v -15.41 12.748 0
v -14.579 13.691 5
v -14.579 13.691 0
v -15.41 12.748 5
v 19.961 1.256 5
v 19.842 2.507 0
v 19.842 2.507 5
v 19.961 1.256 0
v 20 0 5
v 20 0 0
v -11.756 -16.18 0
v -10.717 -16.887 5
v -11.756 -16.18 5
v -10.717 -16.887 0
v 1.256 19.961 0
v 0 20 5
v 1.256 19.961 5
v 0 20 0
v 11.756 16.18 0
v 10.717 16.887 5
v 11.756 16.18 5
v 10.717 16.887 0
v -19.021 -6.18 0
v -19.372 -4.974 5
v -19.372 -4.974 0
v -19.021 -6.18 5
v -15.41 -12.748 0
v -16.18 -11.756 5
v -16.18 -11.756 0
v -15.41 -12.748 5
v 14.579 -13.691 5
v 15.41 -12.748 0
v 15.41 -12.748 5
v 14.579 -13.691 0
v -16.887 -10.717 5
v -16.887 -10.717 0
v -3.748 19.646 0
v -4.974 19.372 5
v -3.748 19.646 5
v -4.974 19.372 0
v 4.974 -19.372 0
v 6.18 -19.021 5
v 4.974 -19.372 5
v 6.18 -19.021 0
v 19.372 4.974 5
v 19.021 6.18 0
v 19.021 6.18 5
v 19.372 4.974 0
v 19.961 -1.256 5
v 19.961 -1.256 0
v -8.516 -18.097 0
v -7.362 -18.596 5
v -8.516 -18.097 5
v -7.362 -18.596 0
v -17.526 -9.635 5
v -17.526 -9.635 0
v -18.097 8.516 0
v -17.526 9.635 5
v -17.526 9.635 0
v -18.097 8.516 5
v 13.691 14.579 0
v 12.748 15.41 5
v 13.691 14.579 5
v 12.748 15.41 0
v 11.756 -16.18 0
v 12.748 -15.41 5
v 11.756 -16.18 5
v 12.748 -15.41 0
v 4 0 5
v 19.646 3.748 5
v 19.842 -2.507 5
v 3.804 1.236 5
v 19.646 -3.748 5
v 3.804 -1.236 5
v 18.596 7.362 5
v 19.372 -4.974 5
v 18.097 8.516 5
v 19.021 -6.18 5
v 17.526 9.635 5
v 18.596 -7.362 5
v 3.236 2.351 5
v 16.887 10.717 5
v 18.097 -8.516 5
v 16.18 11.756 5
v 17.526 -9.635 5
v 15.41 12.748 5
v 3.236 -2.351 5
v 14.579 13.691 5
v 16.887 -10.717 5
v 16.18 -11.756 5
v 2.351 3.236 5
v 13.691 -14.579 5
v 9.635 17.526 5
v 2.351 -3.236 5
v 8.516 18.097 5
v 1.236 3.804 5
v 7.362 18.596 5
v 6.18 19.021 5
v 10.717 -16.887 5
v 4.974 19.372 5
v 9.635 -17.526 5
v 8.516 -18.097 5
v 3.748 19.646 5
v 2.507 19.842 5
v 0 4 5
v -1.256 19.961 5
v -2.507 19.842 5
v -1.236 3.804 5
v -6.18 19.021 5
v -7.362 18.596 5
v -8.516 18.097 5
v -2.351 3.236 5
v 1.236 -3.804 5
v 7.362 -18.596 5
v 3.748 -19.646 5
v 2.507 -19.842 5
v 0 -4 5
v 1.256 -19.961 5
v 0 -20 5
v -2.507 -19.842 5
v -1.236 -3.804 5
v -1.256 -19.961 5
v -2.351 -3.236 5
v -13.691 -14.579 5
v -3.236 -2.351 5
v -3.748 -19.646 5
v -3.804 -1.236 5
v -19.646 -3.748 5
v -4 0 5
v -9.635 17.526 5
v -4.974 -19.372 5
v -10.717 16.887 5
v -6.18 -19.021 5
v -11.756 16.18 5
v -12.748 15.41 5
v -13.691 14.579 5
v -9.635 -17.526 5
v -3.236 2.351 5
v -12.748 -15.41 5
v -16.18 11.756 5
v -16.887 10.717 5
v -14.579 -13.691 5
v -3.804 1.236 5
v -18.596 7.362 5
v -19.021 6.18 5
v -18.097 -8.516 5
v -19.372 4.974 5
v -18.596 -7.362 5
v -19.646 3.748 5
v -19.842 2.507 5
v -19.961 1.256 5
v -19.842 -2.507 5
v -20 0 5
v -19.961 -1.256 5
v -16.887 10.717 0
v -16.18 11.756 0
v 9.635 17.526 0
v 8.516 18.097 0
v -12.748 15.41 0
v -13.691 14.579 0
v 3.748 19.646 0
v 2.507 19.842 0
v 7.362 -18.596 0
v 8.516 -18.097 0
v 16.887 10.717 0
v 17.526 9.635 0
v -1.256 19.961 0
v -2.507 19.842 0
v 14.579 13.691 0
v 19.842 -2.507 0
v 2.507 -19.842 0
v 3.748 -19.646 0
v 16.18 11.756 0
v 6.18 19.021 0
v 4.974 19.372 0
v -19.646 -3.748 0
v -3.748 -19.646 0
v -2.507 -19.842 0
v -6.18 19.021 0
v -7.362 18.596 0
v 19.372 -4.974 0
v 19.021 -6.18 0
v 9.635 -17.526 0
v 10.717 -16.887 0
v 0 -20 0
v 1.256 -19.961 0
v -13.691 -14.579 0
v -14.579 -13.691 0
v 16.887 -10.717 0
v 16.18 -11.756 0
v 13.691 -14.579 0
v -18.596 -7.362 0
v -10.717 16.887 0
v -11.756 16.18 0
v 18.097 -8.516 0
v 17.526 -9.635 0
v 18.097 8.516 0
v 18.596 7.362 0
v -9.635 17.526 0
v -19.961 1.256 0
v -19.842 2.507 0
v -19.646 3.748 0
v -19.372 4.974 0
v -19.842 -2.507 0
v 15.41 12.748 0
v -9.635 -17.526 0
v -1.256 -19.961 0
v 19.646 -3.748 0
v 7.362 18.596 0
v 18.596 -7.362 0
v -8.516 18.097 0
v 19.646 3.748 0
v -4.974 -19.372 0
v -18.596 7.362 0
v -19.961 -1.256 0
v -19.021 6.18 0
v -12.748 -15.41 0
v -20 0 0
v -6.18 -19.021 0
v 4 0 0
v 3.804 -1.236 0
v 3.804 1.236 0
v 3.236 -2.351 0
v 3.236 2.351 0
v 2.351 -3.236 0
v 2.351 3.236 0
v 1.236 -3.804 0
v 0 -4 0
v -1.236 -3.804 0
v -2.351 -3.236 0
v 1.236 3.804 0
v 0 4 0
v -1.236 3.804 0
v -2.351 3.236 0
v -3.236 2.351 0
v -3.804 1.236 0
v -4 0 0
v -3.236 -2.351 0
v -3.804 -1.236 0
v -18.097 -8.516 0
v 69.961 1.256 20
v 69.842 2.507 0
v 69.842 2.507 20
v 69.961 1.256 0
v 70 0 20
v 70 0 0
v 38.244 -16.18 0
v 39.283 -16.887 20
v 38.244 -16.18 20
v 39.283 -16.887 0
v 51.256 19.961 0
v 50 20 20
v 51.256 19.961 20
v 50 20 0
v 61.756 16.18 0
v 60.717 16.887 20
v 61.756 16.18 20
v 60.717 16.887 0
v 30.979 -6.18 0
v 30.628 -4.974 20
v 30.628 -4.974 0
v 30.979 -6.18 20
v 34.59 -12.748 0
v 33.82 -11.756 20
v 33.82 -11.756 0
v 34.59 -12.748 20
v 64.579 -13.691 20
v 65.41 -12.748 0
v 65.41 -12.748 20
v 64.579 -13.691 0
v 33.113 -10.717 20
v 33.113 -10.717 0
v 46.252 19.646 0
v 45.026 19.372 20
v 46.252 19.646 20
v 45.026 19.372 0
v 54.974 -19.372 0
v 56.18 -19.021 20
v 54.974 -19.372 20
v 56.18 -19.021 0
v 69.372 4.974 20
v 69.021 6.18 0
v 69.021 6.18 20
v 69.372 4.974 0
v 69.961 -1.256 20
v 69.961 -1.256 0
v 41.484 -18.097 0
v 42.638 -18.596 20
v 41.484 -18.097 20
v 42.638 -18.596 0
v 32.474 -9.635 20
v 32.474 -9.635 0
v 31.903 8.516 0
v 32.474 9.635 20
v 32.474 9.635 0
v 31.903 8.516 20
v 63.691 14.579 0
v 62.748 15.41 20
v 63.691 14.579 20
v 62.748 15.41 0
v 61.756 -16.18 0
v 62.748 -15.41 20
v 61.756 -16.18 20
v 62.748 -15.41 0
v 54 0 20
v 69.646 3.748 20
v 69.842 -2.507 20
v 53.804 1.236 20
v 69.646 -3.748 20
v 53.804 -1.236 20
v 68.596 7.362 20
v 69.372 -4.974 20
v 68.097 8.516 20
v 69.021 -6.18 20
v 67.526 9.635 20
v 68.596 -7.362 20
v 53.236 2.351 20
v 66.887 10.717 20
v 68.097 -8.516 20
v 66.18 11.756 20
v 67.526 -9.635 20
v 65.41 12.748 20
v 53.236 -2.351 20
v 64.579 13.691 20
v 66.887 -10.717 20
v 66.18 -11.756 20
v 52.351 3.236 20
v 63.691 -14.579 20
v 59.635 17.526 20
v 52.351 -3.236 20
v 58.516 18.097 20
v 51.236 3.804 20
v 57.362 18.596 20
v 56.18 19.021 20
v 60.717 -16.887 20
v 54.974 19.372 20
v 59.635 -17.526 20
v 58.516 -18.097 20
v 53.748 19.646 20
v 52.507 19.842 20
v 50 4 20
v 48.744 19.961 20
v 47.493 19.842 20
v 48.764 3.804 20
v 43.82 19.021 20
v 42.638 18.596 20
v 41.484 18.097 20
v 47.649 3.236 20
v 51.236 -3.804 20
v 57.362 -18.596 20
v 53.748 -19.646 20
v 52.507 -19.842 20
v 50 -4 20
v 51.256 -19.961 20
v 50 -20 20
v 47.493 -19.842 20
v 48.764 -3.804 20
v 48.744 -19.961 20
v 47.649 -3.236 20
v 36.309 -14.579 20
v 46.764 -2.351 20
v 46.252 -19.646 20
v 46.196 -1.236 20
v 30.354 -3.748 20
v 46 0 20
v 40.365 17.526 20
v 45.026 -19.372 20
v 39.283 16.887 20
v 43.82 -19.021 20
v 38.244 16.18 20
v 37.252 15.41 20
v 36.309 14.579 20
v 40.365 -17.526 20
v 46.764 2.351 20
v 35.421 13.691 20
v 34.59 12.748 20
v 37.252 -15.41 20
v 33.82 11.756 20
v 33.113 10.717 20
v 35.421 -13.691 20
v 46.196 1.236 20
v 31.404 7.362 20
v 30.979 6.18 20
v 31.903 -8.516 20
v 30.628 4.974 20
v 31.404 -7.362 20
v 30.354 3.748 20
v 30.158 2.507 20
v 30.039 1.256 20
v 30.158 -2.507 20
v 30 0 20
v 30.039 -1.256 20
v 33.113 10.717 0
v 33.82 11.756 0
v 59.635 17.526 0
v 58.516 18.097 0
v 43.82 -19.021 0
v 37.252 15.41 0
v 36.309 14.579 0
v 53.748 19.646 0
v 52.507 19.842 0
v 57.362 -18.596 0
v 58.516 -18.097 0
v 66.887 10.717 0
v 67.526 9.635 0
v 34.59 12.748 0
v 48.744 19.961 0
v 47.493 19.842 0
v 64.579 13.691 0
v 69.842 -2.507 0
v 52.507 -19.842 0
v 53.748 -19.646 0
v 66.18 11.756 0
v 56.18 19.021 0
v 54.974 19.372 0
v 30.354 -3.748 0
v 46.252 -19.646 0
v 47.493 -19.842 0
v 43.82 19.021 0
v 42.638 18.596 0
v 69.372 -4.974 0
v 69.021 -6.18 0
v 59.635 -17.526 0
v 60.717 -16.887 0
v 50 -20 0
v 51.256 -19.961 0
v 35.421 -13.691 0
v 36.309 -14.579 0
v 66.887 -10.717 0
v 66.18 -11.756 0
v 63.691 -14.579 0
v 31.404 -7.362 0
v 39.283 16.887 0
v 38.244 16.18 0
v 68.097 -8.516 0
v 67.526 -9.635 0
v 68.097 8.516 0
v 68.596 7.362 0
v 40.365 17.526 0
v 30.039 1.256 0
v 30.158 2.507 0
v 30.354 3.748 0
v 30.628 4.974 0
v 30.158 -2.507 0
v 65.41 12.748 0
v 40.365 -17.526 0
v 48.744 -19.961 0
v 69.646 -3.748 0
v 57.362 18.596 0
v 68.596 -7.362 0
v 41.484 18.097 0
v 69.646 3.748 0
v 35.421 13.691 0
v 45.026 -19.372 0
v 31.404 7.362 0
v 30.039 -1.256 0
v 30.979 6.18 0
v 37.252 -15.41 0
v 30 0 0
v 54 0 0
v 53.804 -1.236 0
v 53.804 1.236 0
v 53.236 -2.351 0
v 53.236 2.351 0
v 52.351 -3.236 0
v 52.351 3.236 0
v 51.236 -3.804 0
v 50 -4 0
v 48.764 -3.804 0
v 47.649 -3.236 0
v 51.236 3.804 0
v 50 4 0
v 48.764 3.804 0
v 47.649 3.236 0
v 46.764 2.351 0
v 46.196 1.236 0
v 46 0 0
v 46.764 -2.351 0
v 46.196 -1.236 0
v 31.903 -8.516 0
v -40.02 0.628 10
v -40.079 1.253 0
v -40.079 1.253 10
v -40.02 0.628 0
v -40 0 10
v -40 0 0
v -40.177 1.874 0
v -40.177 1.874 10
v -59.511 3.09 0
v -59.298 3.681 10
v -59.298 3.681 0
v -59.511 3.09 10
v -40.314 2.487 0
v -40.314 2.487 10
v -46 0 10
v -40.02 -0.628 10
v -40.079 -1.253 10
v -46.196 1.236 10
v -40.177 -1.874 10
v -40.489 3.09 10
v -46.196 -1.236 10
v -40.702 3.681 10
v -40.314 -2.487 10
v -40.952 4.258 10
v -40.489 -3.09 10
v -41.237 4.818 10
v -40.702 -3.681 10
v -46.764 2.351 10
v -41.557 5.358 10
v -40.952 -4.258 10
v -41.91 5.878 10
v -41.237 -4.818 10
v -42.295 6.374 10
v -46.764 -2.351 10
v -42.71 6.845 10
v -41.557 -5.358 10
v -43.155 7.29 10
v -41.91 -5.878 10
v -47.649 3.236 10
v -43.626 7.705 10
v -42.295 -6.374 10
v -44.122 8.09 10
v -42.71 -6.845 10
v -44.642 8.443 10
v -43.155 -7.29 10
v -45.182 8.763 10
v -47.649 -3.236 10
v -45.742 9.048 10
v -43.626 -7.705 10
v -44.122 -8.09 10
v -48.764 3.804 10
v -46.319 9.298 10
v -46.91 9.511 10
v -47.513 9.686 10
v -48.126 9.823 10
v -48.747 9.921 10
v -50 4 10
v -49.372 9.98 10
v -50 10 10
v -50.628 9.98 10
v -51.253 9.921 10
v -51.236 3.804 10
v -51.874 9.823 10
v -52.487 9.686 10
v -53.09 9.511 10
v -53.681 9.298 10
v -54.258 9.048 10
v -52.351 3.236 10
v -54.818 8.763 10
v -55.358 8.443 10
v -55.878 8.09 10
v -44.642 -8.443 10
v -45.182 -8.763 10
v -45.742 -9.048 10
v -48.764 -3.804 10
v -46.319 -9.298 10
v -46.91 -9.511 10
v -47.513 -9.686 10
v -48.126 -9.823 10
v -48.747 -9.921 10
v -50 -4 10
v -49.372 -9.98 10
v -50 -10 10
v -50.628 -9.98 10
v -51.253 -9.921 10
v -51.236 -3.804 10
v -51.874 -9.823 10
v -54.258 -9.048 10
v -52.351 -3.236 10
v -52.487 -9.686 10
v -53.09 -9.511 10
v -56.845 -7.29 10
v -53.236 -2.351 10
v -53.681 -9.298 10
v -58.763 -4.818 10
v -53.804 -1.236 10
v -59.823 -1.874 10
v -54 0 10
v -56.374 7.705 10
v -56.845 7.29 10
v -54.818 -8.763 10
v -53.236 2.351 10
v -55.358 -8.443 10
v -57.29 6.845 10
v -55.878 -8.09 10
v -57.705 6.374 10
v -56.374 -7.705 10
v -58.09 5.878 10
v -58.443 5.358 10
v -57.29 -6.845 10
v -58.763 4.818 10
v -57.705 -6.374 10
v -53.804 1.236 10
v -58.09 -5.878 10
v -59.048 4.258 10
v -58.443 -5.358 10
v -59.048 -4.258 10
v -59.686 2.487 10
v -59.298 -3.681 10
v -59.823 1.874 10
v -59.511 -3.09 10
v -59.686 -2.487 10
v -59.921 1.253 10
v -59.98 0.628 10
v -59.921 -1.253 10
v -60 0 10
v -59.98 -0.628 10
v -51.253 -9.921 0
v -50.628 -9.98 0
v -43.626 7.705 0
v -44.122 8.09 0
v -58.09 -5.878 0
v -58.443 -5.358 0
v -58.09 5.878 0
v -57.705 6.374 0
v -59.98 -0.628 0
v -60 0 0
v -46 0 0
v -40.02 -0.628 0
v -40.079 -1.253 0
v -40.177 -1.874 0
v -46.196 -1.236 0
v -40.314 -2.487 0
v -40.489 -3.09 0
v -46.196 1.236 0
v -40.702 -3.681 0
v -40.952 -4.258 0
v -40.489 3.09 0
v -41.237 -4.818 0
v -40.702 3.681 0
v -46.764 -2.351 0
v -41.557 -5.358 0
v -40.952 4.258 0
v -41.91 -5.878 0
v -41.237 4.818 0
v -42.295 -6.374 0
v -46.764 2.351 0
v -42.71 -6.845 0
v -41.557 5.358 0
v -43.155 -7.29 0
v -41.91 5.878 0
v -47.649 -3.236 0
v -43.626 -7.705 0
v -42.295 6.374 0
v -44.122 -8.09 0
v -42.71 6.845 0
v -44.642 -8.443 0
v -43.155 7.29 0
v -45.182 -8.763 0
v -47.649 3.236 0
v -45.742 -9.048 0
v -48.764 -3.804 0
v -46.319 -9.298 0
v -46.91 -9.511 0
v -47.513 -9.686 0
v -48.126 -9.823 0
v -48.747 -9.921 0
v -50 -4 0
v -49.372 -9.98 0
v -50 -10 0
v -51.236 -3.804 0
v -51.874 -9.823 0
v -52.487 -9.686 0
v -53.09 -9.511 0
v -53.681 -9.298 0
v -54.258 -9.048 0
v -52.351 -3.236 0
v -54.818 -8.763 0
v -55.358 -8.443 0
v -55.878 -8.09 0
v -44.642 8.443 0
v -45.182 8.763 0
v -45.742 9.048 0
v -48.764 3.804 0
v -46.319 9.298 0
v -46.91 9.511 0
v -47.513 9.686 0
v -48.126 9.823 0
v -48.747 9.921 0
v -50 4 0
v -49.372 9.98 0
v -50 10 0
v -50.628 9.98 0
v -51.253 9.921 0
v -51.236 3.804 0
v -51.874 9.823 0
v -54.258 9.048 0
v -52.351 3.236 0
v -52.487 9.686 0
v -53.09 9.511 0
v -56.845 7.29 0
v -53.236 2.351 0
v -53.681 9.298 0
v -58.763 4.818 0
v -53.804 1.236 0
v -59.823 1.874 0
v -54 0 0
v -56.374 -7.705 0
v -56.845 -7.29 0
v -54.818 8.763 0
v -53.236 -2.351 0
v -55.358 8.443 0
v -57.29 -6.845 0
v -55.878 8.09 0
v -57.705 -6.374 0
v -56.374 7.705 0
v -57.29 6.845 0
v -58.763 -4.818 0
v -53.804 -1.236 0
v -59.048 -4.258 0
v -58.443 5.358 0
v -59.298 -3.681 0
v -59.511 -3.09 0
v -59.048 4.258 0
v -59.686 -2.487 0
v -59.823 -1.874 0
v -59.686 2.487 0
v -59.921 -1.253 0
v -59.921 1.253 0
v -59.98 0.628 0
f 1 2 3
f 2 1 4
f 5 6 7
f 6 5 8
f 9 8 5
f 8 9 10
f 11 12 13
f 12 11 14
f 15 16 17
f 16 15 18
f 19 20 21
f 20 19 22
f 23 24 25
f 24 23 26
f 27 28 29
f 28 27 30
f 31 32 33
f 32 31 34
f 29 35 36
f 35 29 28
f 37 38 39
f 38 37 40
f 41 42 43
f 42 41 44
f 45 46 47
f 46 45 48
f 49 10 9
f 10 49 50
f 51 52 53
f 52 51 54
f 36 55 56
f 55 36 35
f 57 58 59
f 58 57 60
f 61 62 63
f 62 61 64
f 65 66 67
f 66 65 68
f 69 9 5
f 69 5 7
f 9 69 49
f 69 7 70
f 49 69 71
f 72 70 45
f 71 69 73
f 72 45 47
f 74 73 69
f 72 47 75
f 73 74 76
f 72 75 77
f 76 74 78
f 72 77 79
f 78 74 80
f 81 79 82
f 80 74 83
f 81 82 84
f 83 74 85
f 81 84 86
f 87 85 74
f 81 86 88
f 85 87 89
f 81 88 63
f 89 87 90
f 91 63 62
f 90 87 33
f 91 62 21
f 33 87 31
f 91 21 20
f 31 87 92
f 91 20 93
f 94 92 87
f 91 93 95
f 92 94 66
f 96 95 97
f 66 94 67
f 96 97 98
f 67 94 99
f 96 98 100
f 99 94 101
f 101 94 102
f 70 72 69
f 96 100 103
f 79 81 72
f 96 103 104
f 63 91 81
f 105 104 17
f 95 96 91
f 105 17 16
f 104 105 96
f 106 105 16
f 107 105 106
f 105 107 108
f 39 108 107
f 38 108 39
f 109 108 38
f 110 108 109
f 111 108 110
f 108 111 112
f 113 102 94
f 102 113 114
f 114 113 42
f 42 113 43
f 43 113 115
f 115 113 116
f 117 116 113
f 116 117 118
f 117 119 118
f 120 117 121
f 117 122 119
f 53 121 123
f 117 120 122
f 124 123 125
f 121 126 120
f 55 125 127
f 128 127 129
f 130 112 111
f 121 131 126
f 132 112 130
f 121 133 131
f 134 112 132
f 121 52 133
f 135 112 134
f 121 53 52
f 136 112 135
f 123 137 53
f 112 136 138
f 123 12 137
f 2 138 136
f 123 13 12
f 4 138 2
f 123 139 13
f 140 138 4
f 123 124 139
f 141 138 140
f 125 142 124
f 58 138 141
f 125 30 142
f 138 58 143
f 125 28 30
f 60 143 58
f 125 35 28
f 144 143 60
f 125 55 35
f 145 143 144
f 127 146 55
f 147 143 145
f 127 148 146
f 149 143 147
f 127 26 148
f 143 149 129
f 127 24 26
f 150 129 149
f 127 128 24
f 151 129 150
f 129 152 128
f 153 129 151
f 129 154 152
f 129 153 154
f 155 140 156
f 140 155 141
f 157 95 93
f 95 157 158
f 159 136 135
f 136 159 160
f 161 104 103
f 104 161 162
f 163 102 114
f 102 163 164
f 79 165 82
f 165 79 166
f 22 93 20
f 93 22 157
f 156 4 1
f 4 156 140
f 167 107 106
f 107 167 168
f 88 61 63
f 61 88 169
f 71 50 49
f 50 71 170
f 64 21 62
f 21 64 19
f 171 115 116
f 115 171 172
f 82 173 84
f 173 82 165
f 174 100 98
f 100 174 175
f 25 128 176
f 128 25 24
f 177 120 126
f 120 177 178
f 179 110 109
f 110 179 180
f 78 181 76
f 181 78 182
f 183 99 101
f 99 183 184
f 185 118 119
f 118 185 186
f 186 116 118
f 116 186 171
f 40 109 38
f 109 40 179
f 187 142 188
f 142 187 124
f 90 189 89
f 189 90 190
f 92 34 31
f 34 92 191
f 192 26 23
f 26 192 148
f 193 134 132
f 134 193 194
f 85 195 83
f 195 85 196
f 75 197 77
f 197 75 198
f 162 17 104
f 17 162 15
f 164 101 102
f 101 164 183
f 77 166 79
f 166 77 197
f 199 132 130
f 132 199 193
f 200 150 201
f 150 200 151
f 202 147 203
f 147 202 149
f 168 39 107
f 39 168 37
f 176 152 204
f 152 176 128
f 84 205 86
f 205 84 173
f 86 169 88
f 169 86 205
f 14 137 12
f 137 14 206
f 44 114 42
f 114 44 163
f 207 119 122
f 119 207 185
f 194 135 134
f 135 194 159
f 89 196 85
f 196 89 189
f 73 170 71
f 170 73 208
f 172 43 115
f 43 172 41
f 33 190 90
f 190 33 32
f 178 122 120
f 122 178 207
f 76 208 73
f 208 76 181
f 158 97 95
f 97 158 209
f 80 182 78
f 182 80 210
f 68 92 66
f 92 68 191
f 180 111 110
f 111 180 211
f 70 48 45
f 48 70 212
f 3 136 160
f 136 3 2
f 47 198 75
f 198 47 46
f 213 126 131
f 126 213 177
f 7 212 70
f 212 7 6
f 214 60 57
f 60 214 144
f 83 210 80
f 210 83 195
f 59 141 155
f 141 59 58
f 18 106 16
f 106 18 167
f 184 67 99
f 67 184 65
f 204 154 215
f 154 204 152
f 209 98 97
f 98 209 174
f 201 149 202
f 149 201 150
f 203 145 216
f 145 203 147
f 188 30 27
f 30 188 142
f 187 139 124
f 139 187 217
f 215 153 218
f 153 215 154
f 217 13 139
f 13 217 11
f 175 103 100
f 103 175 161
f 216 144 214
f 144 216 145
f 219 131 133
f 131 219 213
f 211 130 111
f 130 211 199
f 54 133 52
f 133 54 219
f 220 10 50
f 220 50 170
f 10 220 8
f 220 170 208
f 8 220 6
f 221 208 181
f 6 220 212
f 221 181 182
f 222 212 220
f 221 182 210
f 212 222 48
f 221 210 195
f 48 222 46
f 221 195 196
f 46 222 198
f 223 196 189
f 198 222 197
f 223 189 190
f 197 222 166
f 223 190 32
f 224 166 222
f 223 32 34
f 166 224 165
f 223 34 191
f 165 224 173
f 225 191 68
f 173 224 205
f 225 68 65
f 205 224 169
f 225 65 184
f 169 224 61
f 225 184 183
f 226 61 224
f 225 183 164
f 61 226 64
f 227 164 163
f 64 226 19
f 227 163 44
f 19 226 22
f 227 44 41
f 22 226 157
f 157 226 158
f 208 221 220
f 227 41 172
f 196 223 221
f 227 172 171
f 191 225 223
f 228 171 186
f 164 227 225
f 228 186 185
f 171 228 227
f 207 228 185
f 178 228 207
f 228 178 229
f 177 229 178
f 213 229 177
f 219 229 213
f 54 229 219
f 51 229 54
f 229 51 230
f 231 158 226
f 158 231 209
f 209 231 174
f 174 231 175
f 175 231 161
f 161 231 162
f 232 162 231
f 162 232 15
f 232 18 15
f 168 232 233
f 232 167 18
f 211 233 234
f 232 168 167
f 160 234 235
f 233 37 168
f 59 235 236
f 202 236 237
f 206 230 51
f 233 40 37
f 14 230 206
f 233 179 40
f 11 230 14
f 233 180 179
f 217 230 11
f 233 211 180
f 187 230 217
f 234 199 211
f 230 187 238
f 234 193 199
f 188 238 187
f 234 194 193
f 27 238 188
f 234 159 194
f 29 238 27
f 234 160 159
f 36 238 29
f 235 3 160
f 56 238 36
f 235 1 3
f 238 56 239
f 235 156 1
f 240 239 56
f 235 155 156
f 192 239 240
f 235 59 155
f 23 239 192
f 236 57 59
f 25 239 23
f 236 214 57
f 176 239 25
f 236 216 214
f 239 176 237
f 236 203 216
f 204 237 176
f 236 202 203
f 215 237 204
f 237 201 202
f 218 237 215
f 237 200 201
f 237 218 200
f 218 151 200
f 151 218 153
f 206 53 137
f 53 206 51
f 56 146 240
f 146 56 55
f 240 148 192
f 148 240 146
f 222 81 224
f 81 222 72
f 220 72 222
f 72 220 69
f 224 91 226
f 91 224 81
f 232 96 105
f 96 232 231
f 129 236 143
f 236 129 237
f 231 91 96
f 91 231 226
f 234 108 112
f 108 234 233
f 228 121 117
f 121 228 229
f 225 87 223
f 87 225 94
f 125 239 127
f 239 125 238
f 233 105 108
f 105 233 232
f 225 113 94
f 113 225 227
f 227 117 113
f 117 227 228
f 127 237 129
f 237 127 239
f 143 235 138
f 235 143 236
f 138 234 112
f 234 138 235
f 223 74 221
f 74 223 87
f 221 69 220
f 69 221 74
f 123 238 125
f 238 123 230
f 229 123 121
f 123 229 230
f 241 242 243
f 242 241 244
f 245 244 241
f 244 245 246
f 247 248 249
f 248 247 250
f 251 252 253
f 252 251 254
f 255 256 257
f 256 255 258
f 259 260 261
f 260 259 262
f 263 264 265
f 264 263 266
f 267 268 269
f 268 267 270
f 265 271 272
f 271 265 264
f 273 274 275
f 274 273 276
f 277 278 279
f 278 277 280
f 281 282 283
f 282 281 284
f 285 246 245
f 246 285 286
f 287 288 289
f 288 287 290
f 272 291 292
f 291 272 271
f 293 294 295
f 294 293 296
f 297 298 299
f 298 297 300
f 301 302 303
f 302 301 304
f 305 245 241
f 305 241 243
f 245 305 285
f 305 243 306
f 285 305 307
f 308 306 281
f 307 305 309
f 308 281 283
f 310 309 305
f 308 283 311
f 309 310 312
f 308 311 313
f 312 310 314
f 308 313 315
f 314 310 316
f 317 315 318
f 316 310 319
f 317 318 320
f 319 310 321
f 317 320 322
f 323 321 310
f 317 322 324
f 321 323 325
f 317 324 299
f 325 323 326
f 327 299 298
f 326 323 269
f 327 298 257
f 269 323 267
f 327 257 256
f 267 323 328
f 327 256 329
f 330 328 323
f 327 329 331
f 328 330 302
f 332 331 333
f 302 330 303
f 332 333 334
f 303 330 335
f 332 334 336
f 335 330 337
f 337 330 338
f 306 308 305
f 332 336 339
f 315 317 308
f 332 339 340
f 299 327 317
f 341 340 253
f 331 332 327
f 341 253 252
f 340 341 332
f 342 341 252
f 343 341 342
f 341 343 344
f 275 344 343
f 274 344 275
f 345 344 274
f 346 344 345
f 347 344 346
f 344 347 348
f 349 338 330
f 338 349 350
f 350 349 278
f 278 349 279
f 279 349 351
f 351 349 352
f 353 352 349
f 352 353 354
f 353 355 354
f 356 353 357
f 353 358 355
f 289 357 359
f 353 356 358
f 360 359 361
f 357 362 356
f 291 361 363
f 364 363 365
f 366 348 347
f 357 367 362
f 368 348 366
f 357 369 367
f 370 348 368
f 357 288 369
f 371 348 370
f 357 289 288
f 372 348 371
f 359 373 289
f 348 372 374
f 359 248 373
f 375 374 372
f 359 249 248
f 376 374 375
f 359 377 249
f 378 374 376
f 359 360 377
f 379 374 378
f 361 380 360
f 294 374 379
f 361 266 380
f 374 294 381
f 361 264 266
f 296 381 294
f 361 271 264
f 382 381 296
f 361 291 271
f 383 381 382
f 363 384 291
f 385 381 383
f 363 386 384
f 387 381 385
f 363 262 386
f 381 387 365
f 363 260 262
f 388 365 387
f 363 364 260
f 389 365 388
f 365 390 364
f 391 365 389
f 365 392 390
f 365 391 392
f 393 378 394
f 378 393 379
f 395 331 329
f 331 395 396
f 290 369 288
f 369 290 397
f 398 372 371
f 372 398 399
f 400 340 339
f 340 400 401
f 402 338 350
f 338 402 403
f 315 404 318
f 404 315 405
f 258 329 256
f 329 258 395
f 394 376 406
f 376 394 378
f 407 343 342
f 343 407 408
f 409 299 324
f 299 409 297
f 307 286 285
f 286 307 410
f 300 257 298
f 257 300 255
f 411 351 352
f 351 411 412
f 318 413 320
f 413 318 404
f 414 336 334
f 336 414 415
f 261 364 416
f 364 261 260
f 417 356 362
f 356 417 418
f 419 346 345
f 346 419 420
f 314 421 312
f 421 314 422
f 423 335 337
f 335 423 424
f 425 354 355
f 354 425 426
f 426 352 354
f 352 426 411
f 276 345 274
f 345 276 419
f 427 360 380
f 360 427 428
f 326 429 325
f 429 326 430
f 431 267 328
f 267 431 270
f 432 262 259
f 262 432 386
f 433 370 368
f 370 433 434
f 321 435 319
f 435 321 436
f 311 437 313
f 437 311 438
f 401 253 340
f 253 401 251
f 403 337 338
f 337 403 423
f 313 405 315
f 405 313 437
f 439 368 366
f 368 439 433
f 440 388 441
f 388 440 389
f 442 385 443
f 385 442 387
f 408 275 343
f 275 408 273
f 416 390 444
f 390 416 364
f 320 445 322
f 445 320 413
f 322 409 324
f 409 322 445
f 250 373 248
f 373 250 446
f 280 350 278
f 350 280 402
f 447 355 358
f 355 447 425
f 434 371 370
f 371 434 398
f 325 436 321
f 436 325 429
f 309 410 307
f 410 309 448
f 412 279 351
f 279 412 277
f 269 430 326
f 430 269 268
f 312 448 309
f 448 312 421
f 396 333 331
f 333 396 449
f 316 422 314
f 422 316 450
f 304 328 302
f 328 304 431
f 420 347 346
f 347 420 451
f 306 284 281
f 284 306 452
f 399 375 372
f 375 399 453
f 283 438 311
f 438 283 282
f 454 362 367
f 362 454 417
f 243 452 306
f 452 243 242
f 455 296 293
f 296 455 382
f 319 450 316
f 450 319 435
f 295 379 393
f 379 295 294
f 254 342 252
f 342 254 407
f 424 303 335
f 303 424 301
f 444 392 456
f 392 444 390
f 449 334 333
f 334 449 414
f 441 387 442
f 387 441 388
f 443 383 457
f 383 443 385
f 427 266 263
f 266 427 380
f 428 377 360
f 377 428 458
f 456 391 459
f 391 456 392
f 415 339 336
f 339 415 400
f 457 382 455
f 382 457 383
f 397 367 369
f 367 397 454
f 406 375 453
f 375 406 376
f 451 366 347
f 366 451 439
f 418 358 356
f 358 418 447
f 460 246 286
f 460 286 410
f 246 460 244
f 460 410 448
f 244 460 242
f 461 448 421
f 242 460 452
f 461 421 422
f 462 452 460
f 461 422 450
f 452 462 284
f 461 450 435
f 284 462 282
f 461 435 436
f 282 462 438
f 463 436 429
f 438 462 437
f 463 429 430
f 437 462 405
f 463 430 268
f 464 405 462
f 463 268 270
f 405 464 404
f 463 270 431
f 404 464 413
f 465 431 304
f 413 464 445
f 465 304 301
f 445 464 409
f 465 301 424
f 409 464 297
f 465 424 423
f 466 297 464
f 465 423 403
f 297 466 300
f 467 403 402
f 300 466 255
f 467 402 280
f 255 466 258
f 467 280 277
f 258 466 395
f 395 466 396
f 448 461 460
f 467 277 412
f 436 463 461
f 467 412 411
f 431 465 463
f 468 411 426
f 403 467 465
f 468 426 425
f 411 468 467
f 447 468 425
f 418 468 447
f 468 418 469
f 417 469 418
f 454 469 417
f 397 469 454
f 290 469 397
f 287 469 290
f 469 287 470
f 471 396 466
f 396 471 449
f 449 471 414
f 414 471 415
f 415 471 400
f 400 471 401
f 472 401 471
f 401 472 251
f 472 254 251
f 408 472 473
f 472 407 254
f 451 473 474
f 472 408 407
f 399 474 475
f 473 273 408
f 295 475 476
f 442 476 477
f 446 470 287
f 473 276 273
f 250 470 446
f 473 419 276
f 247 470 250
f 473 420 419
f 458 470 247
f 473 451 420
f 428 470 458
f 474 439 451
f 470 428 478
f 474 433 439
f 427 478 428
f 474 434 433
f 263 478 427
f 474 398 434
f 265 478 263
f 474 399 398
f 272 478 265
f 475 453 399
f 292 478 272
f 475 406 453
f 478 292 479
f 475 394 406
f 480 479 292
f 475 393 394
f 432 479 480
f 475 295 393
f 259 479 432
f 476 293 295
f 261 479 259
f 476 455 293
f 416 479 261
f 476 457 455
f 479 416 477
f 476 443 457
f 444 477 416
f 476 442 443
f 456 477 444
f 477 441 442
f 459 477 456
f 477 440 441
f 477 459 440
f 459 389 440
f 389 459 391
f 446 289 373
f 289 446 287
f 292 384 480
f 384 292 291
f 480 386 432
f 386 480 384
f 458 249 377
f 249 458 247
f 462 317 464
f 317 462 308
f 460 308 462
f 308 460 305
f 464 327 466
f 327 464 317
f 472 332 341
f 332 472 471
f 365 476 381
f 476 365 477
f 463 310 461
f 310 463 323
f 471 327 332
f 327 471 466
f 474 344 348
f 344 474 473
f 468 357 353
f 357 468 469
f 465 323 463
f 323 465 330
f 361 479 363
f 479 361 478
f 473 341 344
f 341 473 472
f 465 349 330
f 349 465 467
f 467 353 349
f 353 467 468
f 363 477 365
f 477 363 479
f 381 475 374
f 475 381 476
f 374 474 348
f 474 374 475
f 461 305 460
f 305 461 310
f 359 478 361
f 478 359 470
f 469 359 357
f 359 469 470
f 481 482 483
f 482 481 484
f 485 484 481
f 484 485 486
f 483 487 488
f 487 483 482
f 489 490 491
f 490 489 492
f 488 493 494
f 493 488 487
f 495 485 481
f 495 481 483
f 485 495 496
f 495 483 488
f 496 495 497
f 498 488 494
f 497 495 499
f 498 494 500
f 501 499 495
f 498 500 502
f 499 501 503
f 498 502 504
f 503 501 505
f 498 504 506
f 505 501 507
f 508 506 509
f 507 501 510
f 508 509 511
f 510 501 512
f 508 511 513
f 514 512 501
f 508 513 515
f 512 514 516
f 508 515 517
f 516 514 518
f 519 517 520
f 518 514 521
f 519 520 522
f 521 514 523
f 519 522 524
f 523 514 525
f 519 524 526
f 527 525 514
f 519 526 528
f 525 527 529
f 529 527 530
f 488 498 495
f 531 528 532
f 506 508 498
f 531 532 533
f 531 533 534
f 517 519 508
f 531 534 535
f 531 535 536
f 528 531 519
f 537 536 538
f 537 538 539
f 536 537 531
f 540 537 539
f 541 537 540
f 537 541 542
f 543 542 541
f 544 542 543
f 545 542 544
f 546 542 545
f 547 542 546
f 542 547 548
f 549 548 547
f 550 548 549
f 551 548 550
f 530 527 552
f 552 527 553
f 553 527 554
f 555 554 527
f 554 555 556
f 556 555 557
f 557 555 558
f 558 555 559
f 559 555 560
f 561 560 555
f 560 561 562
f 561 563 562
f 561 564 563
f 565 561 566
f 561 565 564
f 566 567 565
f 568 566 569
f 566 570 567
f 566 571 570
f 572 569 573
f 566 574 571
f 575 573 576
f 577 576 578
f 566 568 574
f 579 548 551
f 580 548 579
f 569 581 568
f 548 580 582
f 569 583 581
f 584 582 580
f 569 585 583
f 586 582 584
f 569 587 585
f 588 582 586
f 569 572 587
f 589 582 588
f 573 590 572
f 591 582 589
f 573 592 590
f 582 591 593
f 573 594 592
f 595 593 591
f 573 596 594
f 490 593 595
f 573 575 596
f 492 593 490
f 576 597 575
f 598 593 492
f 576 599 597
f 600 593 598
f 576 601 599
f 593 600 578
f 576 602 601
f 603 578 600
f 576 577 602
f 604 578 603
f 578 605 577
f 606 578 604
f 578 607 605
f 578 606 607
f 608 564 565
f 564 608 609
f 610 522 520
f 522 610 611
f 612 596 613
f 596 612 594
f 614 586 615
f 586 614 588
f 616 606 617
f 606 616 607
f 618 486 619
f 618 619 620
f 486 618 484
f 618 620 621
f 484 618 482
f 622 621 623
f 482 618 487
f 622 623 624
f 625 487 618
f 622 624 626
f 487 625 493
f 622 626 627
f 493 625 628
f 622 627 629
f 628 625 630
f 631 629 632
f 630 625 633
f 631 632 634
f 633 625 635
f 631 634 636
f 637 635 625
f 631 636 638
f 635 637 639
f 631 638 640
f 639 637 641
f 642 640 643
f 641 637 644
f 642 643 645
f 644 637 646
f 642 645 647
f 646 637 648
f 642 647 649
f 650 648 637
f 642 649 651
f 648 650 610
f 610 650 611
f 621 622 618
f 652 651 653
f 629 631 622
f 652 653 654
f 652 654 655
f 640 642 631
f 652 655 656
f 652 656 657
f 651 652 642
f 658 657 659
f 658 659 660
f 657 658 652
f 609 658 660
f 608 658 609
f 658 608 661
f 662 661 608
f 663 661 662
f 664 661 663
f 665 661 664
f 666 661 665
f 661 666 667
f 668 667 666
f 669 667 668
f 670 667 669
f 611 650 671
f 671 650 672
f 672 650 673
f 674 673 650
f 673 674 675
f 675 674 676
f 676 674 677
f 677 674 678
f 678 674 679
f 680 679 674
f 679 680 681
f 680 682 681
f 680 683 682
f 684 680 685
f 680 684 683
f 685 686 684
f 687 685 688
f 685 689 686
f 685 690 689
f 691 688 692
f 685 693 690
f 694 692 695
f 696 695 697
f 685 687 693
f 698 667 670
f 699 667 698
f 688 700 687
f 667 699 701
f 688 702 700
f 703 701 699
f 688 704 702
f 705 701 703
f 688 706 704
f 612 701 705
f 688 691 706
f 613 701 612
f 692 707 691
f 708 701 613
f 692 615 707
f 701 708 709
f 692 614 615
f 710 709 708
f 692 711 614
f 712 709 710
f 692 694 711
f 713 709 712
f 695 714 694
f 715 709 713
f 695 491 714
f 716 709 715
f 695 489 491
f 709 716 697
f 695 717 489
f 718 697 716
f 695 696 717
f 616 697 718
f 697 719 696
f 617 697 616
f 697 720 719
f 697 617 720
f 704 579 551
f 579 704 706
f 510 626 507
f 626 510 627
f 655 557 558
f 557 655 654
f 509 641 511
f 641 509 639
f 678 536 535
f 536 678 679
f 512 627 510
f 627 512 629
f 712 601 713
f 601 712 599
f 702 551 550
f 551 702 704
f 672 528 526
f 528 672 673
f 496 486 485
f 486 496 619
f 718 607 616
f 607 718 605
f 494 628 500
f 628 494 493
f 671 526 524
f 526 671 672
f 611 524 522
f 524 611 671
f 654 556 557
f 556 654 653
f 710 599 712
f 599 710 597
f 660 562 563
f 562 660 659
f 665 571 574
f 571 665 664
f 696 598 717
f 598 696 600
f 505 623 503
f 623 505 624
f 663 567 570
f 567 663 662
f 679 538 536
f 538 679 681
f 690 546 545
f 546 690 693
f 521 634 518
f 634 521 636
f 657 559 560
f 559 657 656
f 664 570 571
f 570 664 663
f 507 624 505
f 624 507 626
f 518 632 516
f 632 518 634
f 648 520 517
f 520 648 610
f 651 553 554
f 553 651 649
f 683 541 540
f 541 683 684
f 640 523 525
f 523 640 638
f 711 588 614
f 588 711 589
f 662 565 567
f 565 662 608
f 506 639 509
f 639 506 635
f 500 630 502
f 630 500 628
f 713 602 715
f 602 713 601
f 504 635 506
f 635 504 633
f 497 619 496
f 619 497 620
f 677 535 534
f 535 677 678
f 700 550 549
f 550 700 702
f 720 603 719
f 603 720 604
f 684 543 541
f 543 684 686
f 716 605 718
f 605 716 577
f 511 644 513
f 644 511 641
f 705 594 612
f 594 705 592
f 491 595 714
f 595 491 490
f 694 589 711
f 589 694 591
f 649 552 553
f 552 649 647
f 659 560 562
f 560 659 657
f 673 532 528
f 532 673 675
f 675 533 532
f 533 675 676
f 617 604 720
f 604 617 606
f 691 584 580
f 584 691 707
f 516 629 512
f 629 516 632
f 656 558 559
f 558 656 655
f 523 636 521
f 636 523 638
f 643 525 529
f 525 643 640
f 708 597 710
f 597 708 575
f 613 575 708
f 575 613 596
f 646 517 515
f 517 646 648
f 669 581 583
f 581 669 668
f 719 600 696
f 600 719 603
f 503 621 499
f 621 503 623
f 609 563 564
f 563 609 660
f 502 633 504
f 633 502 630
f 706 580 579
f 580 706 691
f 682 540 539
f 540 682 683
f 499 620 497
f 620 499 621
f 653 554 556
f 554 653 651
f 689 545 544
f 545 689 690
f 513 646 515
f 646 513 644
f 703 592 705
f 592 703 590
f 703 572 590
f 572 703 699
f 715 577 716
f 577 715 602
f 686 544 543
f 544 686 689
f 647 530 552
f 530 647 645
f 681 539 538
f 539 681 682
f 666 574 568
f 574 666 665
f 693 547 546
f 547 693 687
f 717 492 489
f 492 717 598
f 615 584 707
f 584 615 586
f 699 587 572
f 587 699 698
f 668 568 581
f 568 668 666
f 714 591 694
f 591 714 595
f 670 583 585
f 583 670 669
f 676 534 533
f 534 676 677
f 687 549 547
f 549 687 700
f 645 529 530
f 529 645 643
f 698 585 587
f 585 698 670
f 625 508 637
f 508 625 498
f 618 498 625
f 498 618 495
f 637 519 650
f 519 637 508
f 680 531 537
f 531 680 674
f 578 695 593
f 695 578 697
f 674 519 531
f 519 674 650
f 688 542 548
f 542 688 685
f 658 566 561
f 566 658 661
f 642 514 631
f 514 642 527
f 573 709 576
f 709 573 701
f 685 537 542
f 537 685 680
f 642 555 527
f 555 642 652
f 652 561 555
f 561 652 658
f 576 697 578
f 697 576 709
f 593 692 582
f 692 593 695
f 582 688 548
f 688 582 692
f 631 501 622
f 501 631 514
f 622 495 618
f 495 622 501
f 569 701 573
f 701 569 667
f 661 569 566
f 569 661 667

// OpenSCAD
//----------------------------------------------------------
//-- Tutorial OpenScad
//-- Juan Gonzalez-Gomez (Obijuan) juan@iearobotics.com
//----------------------------------------------------------
//-- (c) Mayo, 2012
//-- Licencia GPL
//----------------------------------------------------------
//-- Rueda modularizada con parametros por defecto
//----------------------------------------------------------

module rueda_simple(grosor=5, diametro=40, diam_eje=8)
{
  //-- Construcción de la rueda a partir de
  //-- los parámetros
  difference() {
    //-- Base de la rueda
    cylinder(r=diametro/2, h=grosor,$fn=100);

    //-- Taladro del eje
    cylinder(r=diam_eje/2, h=3*grosor,$fn=20,center=true);
  }
}

//-- Ejemplos de utilizacion
rueda_simple();

translate([50,0,0])
   rueda_simple(grosor=20);

translate([-50,0,0])
  rueda_simple(diametro=20, grosor=10);
